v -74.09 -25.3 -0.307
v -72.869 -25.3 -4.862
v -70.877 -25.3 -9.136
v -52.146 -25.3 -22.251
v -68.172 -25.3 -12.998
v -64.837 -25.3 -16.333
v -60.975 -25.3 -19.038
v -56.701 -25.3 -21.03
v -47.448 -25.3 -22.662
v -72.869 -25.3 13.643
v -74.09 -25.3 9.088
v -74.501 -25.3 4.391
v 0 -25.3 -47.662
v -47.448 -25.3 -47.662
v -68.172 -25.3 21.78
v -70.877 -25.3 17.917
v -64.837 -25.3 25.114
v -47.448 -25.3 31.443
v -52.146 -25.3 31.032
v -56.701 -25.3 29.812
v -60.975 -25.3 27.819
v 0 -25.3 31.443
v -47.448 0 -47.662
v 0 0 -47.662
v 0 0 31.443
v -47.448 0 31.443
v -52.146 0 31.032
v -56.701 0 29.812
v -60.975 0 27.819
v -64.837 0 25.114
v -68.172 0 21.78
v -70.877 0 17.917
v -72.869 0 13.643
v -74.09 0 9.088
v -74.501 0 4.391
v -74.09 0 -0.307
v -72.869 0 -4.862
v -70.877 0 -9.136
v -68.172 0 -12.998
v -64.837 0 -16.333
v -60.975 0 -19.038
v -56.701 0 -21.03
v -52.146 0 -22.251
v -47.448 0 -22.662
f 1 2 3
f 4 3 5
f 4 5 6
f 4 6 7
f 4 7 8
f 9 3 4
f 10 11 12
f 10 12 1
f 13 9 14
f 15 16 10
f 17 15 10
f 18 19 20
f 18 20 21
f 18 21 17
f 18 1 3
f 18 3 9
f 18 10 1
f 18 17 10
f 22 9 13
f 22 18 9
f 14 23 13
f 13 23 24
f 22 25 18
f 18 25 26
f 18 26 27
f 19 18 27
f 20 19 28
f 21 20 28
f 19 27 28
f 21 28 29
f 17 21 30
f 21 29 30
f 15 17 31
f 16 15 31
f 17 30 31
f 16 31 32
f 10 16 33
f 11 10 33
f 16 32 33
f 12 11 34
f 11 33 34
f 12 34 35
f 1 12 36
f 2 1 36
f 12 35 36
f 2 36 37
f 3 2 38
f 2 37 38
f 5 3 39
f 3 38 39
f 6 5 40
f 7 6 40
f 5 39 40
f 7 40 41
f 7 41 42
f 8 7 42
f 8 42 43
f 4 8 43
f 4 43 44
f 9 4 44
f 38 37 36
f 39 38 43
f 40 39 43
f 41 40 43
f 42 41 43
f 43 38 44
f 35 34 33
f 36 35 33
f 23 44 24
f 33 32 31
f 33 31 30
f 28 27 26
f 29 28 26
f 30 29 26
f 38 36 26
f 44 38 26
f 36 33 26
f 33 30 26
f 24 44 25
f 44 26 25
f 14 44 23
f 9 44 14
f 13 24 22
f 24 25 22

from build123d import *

# Parameters (mm, degrees)
F1_DEPTH = 25.3
F2_DEPTH = 25


with BuildPart() as f1:
    # F0 (on Front) → F1 (new body)
    with BuildSketch(Plane.XZ):
        with BuildLine():
            ThreePointArc((-47.4482923746, 31.4433462918), (-74.5009016246, 4.3907370418), (-47.4482923746, -22.6618722081))
            Line((-47.4482923746, -22.6618722081), (0, -22.6618722081))
            Line((0, -22.6618722081), (0, 31.4433462918))
            Line((0, 31.4433462918), (-47.4482923746, 31.4433462918))
        make_face()
    extrude(amount=F1_DEPTH)

    # F2 (add): faces of the model
    f2_faces = [f1.faces().sort_by_distance(p)[0] for p in [
        (-23.7241461873, -12.65, -22.6618722081),
        (-23.7241461873, -12.65, 31.4433462918),
    ]]
    extrude(f2_faces, amount=F2_DEPTH, dir=(0, 0, -1))


solid = f1.part
